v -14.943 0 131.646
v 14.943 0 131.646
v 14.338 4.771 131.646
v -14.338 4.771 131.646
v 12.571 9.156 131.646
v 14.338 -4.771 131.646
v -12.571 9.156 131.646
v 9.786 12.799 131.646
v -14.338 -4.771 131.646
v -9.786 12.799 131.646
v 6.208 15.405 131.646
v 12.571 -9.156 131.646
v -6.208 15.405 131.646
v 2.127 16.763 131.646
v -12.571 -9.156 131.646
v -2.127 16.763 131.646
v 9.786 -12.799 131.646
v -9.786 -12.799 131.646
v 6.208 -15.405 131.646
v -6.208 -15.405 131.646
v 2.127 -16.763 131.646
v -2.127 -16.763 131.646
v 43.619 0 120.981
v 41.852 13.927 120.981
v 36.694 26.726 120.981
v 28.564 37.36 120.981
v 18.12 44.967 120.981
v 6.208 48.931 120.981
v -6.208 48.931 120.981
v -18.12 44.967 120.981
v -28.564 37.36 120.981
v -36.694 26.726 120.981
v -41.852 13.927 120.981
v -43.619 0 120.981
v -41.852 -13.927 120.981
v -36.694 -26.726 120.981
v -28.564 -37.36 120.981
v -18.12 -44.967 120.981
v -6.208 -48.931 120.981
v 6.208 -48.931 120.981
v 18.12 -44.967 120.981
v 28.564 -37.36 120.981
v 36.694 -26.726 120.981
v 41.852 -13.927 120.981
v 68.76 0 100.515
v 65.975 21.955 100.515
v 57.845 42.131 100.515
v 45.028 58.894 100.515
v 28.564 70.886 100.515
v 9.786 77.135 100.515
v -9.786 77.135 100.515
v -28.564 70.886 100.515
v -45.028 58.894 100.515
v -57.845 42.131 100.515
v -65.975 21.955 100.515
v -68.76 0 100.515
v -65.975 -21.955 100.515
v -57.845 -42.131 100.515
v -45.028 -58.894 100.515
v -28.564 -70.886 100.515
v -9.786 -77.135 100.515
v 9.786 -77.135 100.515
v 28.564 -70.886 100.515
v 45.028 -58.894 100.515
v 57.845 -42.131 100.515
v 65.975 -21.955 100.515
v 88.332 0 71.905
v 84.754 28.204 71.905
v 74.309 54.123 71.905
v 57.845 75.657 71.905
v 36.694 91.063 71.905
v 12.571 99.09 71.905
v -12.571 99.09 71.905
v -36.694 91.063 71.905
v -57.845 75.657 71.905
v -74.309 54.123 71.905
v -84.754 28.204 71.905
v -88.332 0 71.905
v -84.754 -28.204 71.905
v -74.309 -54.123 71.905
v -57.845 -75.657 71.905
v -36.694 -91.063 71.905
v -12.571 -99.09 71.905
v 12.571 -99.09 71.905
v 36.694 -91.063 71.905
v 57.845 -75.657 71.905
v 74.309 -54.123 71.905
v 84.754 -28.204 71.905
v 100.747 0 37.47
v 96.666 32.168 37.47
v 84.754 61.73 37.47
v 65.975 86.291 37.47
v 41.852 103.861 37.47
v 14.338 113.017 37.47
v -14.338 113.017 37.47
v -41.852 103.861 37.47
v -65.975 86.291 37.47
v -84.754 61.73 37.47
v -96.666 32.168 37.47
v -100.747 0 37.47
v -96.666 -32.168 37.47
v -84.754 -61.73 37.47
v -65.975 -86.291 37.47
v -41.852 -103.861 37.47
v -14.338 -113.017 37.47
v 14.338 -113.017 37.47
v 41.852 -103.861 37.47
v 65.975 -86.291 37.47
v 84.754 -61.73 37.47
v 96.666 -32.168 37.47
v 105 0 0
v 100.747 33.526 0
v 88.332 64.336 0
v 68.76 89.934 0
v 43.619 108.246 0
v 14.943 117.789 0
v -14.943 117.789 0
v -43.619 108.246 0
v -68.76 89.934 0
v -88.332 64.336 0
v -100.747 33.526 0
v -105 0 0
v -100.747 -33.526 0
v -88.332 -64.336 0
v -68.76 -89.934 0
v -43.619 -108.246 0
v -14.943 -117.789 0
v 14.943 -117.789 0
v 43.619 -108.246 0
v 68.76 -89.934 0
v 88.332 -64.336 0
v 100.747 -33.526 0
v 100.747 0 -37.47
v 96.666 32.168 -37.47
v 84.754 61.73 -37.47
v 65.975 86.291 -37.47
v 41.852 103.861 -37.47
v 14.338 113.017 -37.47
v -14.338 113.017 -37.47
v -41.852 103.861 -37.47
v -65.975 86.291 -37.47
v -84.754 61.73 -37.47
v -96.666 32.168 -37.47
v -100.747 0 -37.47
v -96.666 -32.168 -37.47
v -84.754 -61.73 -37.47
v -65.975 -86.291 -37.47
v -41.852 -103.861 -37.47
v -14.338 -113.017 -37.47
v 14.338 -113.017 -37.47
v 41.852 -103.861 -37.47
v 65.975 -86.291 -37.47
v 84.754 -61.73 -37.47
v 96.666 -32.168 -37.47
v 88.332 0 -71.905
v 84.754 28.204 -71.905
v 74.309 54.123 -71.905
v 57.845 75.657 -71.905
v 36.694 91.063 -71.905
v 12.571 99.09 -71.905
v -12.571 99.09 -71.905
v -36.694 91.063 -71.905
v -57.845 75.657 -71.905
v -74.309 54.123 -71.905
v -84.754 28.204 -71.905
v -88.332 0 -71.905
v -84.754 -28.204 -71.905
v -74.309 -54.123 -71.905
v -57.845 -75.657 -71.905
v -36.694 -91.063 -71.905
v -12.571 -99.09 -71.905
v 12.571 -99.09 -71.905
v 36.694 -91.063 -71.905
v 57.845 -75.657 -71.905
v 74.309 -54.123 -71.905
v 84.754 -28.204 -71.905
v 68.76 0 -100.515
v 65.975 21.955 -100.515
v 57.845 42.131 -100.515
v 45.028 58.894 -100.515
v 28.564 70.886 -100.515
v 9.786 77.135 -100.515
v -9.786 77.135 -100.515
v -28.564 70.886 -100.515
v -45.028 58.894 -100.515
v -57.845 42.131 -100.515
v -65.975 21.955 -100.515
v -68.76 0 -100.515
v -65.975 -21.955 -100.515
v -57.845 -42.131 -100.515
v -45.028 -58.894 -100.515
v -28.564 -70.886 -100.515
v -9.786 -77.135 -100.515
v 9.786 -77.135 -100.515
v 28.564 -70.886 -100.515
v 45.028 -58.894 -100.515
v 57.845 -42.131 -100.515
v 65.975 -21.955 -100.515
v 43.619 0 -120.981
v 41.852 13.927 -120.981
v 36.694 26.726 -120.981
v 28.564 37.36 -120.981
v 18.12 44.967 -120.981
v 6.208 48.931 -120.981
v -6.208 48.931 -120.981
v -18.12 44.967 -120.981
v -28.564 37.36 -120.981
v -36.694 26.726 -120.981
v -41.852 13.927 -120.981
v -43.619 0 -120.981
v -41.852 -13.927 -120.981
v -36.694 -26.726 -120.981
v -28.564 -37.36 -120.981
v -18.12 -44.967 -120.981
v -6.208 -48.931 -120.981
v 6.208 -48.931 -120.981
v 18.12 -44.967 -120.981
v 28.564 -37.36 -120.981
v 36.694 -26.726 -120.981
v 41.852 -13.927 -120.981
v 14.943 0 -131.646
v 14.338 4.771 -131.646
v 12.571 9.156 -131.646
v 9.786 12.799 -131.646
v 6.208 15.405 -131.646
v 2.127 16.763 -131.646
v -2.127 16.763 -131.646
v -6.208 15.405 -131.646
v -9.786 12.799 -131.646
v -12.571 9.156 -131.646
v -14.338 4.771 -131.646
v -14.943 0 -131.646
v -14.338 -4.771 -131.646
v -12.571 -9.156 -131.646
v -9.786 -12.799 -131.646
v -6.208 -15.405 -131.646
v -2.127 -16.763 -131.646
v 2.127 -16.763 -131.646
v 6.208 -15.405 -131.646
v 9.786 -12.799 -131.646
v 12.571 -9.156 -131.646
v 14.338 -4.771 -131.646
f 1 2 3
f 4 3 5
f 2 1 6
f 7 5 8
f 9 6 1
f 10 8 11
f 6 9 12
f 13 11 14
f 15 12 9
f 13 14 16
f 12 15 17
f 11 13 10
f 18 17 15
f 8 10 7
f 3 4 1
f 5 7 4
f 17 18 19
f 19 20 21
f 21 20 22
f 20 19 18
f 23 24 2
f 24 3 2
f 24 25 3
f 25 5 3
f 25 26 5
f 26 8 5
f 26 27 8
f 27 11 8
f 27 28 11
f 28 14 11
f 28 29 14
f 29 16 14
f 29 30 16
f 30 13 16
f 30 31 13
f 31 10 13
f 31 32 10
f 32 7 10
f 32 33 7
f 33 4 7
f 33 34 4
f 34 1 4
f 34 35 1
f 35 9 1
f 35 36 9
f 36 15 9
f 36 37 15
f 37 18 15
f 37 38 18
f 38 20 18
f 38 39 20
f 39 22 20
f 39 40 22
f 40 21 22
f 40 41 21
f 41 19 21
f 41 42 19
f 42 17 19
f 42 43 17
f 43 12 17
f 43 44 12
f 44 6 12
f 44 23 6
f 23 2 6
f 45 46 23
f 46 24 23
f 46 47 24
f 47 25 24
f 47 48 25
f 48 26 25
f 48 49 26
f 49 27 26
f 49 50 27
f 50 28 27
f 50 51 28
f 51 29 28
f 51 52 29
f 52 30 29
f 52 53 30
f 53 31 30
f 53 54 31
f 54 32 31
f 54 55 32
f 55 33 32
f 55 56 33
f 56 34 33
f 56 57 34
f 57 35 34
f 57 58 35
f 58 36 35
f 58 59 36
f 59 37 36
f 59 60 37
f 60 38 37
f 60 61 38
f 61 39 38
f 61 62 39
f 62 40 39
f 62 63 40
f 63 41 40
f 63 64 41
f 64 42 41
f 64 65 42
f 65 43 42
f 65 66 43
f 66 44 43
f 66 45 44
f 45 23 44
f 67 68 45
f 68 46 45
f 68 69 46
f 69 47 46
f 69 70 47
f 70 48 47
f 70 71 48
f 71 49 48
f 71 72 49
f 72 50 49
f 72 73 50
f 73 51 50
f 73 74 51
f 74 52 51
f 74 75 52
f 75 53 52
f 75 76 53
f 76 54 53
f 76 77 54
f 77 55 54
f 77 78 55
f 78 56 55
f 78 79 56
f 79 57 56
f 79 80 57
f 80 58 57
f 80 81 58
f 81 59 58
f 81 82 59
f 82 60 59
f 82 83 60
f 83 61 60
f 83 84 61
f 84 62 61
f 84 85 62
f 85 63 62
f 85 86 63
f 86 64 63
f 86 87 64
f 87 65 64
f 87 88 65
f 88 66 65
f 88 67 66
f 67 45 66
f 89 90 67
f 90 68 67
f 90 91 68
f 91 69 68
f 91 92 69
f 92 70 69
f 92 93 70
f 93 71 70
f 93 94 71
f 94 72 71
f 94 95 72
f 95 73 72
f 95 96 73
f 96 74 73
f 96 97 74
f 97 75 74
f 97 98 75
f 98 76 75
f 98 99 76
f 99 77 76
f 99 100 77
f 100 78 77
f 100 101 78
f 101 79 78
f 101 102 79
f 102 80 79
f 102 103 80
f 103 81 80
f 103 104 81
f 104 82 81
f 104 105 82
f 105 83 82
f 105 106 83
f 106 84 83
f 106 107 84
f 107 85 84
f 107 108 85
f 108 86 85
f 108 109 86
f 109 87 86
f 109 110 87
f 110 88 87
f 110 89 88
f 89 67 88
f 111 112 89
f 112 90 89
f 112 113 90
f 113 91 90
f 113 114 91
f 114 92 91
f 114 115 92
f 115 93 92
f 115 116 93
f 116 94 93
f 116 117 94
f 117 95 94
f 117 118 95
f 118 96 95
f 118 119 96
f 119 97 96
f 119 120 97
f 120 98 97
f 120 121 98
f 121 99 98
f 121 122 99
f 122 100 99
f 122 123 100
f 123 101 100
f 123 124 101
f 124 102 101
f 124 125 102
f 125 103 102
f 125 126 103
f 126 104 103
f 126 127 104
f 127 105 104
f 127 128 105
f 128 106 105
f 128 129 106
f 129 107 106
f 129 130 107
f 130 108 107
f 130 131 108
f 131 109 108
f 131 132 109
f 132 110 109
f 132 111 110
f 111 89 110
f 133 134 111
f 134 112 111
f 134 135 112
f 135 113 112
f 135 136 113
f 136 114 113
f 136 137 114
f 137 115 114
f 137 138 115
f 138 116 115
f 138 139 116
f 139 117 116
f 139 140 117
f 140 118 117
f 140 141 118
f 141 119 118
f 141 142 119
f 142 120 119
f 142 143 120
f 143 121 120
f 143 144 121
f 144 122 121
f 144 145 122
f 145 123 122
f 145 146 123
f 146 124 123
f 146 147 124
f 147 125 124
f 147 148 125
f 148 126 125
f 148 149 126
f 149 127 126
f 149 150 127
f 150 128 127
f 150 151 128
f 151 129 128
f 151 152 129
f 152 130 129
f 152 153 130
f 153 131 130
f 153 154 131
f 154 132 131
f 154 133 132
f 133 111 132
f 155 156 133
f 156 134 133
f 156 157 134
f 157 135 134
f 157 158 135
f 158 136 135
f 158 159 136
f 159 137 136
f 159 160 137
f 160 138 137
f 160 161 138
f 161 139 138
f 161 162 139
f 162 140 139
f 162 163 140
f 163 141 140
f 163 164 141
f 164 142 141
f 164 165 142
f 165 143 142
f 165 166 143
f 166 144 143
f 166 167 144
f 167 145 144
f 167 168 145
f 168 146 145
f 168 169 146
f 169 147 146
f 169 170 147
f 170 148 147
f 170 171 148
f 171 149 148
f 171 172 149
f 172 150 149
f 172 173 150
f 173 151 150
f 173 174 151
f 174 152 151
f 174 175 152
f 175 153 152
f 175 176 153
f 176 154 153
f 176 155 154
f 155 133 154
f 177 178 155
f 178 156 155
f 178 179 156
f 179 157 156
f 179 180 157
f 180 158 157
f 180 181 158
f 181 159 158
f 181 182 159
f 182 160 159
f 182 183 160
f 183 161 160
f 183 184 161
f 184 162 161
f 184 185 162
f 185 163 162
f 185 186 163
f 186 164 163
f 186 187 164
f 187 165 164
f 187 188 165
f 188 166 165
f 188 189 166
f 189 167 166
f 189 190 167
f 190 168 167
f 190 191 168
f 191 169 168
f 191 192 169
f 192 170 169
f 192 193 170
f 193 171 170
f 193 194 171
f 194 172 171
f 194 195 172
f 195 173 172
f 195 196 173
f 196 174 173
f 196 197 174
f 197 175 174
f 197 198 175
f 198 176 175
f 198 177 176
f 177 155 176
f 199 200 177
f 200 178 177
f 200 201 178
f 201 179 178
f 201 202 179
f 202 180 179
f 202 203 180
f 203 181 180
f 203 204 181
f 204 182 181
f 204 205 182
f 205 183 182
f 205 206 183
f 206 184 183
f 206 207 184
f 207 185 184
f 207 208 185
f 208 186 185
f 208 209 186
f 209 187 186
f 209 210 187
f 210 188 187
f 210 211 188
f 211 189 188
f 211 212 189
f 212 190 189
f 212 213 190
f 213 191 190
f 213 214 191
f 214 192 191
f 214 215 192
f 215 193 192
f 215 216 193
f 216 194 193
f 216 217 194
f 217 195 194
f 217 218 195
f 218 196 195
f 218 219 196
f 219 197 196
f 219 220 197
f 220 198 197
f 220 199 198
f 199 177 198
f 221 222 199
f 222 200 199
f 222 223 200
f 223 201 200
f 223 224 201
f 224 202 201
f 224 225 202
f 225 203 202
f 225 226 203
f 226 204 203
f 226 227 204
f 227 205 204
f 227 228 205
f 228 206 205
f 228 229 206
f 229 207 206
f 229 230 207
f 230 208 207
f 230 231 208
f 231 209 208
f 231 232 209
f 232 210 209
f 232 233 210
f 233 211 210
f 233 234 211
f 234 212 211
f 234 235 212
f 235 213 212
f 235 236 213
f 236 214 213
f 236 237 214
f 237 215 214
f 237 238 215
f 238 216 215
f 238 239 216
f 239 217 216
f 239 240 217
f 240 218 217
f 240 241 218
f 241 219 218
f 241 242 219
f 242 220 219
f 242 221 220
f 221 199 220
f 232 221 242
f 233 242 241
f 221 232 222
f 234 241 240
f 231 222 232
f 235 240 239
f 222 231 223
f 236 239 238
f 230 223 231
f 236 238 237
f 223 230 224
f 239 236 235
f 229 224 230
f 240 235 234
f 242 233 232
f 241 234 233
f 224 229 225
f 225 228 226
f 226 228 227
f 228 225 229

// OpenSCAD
// Generated by SolidPython 1.0.1 on 2020-07-29 00:46:52


scale(v = [15, 17, 19]) {
	sphere(r = 7);
}
/***********************************************
*********      SolidPython code:      **********
************************************************
 
# import packages: SolidPython
from solid import *
from solid.utils import *
from itertools import chain, combinations, permutations


class Resize:

    def __init__(self, scad_file):
        self.scad_file = scad_file
        #self.scad_file = import_scad(scad_file)
        # cone/cylinder param:
        self.r1 = 0
        self.r2 = 0
        self.h = 0
        # rectangular prism param:
        self.w = 0
        self.l = 0
        # ellipse param:
        self.r = 0

    # import OpenScad code (file name corresponds to shape)


    # classify shape + parameters
    def assign(self, param1, param2, param3):
        if self.scad_file == 'cone.scad':
            self.r1 = param1
            self.r2 = param2
            self.h = param3
        elif self.scad_file == 'cylinder.scad':
            self.r1 = param1
            self.r2 = param2
            self.h = param3
        elif self.scad_file == 'rectangularPrism.scad':
            self.h = param1
            self.l = param2
            self.w = param3
        else:
            self.r = param1
            self.h = param2

    # resize parameters
    def iterate(self):
        x = range(3, 20, 2)
        i = 1
        if self.scad_file == 'cone.scad':
            tempList = list(permutations(x, 2))
            for temp in tempList:
                param1 = temp[0]
                param2 = temp[1]
                filepath = 'produced_scad_files/' + 'cone' + str(param1) + '_' + str(param2) + '_' + '.scad'
                scad_render_to_file(cylinder(h=param1, r1=param2, r2=0), filepath)

        elif self.scad_file == 'cylinder.scad':
            tempList = list(permutations(x, 3))
            for temp in tempList:
                param1 = temp[0]
                param2 = temp[1]
                filepath = 'produced_scad_files/' + 'cylinder' + str(param1) + '_' + str(param2) + '_' + '.scad'
                scad_render_to_file(cylinder(h=param1, r1=param2, r2=param2), filepath)

        elif self.scad_file == 'rectangularPrism.scad':
            tempList = list(permutations(x, 3))
            for temp in tempList:
                param1 = temp[0]
                param2 = temp[1]
                param3 = temp[2]
                filepath = 'produced_scad_files/' + 'rectangularPrism' + str(param1) + '_' + str(param2) + '_' + str(
                    param3) + '.scad'
                scad_render_to_file(cube(size=(param1, param2, param3)), filepath)

        elif self.scad_file == 'ellipse.scad':
            tempList = list(permutations(x, 4))
            for temp in tempList:
                param1 = temp[0]
                param2 = temp[1]
                param3 = temp[2]
                param4 = temp[3]
                filepath = 'produced_scad_files/' + 'ellipse' + str(param1) + '_' + str(param2) + '_' + str(param3) + '_' + str(param4) + '.scad'
                scad_render_to_file(scale([param1, param2, param3])(sphere(r=param4)), filepath)

    def render_to_scadfile(self):
        scad_render_to_file(scad, 'example.scad') 
 
************************************************/
